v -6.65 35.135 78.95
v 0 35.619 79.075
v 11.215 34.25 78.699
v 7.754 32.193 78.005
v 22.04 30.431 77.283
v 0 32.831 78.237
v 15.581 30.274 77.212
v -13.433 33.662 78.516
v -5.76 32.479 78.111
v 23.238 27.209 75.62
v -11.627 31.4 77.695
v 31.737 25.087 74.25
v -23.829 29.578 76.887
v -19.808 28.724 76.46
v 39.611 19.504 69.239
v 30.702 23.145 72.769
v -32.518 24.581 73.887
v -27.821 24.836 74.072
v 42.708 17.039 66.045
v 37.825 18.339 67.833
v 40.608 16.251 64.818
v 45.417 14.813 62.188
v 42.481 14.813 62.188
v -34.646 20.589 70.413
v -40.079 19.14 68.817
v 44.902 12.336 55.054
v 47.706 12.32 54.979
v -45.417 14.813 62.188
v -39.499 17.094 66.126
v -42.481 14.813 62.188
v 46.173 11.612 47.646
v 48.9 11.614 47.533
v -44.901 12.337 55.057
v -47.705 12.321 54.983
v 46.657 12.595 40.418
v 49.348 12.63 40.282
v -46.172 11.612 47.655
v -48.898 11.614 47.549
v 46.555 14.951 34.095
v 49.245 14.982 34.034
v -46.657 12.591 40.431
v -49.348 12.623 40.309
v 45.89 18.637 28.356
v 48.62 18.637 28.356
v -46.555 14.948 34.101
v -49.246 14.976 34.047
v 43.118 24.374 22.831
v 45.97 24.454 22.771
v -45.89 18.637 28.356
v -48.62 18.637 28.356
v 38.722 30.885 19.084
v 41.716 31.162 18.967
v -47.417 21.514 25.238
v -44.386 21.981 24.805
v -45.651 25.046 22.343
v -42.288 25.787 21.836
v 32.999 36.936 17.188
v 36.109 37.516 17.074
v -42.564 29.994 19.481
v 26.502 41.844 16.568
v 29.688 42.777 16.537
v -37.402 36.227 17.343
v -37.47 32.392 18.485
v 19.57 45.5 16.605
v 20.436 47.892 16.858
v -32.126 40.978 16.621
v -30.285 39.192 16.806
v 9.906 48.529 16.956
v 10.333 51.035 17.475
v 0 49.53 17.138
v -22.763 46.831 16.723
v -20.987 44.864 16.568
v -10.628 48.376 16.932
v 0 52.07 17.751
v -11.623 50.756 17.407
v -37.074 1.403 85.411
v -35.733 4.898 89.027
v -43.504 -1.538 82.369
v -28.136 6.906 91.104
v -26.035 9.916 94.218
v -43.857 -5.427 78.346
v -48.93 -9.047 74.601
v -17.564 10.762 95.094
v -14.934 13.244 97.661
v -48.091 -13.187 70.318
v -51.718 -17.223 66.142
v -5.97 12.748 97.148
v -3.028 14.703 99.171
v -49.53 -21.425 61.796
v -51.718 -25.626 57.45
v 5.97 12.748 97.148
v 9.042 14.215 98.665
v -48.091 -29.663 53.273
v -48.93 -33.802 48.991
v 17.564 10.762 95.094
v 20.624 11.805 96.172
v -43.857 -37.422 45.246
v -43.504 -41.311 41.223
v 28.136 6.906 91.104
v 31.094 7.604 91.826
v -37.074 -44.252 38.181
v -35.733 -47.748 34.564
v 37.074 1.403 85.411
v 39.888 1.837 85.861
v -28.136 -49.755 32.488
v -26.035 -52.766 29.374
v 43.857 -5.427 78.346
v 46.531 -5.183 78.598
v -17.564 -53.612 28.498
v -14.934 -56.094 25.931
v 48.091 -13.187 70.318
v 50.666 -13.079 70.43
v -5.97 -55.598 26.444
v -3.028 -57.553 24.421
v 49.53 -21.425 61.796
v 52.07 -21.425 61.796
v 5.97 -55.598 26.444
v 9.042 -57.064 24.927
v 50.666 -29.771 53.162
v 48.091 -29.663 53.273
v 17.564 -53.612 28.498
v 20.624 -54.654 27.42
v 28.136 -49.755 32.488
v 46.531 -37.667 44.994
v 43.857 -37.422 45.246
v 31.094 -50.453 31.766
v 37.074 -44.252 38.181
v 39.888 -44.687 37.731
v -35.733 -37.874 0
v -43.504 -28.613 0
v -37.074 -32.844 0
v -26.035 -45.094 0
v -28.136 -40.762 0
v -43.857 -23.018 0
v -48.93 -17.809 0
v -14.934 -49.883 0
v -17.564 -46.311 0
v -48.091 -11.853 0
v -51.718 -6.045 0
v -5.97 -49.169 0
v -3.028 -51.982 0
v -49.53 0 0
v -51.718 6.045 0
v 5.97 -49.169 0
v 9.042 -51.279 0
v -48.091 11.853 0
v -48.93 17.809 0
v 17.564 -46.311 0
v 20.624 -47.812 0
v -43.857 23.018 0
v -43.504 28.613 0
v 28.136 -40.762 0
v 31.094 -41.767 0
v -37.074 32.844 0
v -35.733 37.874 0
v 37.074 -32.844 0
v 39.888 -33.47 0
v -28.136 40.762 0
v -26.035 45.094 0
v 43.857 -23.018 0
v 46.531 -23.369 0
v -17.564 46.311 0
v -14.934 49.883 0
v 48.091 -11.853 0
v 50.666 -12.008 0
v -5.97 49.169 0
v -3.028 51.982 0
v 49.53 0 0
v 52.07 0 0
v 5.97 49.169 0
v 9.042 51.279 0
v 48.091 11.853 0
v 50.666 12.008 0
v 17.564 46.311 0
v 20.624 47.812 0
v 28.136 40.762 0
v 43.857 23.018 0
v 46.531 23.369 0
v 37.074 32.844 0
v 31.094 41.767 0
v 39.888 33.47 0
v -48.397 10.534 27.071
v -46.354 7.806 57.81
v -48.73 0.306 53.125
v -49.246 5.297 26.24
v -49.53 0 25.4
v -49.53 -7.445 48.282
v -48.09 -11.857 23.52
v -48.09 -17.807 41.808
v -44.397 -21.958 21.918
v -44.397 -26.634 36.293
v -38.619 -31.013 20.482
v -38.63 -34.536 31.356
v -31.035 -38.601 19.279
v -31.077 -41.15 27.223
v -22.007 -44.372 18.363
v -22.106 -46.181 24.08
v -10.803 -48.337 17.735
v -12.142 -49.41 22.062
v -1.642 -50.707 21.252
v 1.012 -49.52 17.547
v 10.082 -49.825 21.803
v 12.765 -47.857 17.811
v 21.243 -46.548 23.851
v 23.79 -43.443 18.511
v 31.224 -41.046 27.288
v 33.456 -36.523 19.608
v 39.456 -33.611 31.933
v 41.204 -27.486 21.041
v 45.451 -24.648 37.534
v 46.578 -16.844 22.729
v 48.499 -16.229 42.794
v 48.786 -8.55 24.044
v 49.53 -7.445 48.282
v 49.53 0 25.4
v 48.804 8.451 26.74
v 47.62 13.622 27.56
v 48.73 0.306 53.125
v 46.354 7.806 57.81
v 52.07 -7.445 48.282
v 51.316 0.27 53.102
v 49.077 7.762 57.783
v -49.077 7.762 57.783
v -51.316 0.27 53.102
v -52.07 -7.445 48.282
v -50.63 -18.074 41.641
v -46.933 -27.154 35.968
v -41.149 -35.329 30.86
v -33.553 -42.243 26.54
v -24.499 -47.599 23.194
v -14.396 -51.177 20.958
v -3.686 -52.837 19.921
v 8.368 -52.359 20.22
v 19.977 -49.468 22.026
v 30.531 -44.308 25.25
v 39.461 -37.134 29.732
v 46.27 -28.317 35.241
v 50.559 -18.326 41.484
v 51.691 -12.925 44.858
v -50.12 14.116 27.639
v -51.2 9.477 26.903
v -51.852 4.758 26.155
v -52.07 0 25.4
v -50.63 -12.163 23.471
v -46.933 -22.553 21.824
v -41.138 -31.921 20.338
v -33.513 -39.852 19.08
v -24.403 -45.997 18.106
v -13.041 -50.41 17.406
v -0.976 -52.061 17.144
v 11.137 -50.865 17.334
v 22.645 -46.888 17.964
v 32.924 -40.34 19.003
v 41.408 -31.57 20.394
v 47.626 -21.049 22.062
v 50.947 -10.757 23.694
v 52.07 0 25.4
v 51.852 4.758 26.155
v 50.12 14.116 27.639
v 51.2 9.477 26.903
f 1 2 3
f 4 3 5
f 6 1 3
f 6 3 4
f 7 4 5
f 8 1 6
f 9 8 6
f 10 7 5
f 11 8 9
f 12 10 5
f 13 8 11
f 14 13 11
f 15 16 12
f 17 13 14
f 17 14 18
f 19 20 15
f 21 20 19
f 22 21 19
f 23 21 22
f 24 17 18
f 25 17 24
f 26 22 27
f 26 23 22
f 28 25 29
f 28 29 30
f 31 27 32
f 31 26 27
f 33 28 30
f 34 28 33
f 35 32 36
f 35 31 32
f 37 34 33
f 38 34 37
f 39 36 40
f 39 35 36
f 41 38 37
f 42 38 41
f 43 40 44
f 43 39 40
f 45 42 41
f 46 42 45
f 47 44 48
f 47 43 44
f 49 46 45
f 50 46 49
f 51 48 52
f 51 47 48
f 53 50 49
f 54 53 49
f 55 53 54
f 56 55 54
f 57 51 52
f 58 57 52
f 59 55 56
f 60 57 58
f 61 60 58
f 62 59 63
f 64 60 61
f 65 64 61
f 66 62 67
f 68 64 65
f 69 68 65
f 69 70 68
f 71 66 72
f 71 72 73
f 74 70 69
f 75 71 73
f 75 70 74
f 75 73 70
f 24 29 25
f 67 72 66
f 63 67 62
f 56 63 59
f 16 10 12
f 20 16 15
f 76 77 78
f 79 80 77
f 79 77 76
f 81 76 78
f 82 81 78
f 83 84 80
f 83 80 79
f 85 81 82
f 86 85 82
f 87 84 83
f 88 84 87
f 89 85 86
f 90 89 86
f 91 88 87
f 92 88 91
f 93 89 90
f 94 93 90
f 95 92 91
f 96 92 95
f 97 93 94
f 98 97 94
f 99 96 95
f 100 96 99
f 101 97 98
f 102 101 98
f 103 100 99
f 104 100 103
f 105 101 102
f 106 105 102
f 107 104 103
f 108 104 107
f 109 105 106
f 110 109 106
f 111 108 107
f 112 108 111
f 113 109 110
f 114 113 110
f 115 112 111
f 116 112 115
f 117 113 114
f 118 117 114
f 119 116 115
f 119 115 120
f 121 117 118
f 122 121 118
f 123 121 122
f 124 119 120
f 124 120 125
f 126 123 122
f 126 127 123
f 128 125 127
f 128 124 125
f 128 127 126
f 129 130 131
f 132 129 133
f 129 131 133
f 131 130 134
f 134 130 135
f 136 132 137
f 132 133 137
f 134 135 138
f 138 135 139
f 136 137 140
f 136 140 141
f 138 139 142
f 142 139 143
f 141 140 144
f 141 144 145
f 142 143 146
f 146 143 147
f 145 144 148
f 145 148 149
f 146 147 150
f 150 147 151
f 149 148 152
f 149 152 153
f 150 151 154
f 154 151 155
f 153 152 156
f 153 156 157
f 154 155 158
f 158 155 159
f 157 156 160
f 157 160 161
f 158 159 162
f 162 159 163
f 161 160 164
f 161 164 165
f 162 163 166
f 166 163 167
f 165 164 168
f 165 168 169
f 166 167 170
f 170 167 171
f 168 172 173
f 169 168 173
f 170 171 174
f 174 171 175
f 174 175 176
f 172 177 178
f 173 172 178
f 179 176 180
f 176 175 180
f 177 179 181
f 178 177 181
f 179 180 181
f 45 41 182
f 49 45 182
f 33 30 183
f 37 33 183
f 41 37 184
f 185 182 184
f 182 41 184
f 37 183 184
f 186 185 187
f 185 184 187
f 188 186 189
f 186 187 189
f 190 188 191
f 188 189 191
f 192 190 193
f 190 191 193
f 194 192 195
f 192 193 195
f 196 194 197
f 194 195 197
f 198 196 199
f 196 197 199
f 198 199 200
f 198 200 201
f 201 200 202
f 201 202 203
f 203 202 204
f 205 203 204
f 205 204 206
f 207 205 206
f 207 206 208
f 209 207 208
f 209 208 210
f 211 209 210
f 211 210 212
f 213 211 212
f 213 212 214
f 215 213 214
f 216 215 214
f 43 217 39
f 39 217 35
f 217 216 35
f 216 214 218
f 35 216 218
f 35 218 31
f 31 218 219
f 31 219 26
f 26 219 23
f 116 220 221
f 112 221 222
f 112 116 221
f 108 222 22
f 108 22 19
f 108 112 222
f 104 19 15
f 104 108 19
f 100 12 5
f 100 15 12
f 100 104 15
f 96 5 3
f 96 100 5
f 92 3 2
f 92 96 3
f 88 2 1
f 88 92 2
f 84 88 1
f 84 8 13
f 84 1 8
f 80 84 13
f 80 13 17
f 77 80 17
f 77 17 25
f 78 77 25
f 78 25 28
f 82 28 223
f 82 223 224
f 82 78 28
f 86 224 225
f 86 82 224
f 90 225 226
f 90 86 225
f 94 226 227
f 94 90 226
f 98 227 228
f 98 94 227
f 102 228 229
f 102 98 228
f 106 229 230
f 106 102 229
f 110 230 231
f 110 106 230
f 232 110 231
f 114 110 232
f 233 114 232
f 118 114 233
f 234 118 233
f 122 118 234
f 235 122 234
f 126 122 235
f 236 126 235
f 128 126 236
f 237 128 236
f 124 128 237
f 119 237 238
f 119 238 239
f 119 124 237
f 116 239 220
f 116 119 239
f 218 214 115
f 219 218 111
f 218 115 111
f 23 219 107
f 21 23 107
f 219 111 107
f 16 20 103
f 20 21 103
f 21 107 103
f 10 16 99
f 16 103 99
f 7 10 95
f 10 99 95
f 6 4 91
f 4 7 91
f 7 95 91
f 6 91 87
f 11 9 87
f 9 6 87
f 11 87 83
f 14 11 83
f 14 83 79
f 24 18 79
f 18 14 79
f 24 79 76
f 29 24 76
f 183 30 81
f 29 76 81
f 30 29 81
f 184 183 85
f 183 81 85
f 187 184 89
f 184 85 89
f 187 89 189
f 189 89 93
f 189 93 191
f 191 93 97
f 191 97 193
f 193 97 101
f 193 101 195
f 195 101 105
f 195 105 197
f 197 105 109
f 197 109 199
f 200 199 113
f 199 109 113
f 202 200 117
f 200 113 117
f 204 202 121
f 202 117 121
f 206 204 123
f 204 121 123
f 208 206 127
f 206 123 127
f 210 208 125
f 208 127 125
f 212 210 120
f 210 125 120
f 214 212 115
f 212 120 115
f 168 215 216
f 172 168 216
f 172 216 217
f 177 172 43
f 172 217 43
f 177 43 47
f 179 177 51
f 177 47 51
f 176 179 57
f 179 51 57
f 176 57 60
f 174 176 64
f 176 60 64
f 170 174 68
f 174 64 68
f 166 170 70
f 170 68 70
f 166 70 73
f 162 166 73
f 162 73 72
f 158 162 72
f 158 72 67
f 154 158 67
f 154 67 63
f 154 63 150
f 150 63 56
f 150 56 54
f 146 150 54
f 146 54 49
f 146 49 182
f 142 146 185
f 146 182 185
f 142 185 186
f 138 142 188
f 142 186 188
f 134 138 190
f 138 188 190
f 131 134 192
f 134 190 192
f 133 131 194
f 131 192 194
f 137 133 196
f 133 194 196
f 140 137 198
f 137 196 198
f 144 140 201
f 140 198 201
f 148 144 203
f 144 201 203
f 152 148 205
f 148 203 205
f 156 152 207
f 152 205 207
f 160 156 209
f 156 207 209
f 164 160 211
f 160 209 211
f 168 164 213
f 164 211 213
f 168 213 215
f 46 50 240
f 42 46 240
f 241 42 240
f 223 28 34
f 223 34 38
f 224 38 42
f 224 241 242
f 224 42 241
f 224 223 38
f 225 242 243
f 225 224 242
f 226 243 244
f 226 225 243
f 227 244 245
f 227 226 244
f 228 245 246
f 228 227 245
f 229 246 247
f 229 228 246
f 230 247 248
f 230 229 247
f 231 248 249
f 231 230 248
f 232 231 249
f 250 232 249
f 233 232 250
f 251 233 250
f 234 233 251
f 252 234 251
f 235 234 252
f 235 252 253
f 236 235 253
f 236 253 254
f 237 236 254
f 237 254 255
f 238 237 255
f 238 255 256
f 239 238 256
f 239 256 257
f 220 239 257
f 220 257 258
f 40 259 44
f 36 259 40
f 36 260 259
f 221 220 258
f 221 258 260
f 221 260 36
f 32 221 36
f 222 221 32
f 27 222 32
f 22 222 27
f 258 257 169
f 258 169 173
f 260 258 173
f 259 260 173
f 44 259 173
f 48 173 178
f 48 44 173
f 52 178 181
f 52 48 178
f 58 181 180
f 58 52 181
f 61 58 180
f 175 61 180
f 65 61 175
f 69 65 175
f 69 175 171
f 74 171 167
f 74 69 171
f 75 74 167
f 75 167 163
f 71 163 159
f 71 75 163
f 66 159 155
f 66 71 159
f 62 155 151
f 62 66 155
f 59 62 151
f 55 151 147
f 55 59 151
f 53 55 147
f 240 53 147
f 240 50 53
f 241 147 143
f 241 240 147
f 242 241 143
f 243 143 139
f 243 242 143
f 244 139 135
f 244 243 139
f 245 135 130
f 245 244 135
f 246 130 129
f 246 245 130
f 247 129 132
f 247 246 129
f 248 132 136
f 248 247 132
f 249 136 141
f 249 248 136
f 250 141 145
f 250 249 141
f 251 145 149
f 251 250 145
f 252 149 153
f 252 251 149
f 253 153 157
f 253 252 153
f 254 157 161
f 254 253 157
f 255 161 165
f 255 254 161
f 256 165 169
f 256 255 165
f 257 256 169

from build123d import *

# Parameters (mm, degrees)
F0_R          = 52.07
F0_R_2        = 49.53
F4_DEPTH      = 50.8
F4_DEPTH_BACK = 50.8


with BuildPart() as f2:
    # F2: sweep along a path in F1
    with BuildLine(Plane.YZ) as f2_path:
        Line((0, 0), (0, 25.4))
        Line((0, 25.4), (-7.4446247891, 48.2820980251))
        Line((-7.4446247891, 48.2820980251), (-21.4247759432, 61.7959573865))
    # F0 (on Top) → F2 (sweep)
    with BuildSketch(Plane.XY):
        Circle(F0_R)
        Circle(F0_R_2, mode=Mode.SUBTRACT)
    sweep(path=f2_path.line, transition=Transition.RIGHT)

    # F3 (on Right) → F4 (cut, two sides)
    with BuildSketch(Plane.YZ) as f4_sk:
        with BuildLine():
            ThreePointArc((11.6053752109, 48.2820980251), (43.3553752109, 16.5320980251), (75.1053752109, 48.2820980251))
            ThreePointArc((75.1053752109, 48.2820980251), (43.3553752109, 80.0320980251), (11.6053752109, 48.2820980251))
        make_face()
    extrude(amount=-F4_DEPTH, mode=Mode.SUBTRACT)
    extrude(f4_sk.sketch, amount=F4_DEPTH_BACK, mode=Mode.SUBTRACT)


solid = f2.part
